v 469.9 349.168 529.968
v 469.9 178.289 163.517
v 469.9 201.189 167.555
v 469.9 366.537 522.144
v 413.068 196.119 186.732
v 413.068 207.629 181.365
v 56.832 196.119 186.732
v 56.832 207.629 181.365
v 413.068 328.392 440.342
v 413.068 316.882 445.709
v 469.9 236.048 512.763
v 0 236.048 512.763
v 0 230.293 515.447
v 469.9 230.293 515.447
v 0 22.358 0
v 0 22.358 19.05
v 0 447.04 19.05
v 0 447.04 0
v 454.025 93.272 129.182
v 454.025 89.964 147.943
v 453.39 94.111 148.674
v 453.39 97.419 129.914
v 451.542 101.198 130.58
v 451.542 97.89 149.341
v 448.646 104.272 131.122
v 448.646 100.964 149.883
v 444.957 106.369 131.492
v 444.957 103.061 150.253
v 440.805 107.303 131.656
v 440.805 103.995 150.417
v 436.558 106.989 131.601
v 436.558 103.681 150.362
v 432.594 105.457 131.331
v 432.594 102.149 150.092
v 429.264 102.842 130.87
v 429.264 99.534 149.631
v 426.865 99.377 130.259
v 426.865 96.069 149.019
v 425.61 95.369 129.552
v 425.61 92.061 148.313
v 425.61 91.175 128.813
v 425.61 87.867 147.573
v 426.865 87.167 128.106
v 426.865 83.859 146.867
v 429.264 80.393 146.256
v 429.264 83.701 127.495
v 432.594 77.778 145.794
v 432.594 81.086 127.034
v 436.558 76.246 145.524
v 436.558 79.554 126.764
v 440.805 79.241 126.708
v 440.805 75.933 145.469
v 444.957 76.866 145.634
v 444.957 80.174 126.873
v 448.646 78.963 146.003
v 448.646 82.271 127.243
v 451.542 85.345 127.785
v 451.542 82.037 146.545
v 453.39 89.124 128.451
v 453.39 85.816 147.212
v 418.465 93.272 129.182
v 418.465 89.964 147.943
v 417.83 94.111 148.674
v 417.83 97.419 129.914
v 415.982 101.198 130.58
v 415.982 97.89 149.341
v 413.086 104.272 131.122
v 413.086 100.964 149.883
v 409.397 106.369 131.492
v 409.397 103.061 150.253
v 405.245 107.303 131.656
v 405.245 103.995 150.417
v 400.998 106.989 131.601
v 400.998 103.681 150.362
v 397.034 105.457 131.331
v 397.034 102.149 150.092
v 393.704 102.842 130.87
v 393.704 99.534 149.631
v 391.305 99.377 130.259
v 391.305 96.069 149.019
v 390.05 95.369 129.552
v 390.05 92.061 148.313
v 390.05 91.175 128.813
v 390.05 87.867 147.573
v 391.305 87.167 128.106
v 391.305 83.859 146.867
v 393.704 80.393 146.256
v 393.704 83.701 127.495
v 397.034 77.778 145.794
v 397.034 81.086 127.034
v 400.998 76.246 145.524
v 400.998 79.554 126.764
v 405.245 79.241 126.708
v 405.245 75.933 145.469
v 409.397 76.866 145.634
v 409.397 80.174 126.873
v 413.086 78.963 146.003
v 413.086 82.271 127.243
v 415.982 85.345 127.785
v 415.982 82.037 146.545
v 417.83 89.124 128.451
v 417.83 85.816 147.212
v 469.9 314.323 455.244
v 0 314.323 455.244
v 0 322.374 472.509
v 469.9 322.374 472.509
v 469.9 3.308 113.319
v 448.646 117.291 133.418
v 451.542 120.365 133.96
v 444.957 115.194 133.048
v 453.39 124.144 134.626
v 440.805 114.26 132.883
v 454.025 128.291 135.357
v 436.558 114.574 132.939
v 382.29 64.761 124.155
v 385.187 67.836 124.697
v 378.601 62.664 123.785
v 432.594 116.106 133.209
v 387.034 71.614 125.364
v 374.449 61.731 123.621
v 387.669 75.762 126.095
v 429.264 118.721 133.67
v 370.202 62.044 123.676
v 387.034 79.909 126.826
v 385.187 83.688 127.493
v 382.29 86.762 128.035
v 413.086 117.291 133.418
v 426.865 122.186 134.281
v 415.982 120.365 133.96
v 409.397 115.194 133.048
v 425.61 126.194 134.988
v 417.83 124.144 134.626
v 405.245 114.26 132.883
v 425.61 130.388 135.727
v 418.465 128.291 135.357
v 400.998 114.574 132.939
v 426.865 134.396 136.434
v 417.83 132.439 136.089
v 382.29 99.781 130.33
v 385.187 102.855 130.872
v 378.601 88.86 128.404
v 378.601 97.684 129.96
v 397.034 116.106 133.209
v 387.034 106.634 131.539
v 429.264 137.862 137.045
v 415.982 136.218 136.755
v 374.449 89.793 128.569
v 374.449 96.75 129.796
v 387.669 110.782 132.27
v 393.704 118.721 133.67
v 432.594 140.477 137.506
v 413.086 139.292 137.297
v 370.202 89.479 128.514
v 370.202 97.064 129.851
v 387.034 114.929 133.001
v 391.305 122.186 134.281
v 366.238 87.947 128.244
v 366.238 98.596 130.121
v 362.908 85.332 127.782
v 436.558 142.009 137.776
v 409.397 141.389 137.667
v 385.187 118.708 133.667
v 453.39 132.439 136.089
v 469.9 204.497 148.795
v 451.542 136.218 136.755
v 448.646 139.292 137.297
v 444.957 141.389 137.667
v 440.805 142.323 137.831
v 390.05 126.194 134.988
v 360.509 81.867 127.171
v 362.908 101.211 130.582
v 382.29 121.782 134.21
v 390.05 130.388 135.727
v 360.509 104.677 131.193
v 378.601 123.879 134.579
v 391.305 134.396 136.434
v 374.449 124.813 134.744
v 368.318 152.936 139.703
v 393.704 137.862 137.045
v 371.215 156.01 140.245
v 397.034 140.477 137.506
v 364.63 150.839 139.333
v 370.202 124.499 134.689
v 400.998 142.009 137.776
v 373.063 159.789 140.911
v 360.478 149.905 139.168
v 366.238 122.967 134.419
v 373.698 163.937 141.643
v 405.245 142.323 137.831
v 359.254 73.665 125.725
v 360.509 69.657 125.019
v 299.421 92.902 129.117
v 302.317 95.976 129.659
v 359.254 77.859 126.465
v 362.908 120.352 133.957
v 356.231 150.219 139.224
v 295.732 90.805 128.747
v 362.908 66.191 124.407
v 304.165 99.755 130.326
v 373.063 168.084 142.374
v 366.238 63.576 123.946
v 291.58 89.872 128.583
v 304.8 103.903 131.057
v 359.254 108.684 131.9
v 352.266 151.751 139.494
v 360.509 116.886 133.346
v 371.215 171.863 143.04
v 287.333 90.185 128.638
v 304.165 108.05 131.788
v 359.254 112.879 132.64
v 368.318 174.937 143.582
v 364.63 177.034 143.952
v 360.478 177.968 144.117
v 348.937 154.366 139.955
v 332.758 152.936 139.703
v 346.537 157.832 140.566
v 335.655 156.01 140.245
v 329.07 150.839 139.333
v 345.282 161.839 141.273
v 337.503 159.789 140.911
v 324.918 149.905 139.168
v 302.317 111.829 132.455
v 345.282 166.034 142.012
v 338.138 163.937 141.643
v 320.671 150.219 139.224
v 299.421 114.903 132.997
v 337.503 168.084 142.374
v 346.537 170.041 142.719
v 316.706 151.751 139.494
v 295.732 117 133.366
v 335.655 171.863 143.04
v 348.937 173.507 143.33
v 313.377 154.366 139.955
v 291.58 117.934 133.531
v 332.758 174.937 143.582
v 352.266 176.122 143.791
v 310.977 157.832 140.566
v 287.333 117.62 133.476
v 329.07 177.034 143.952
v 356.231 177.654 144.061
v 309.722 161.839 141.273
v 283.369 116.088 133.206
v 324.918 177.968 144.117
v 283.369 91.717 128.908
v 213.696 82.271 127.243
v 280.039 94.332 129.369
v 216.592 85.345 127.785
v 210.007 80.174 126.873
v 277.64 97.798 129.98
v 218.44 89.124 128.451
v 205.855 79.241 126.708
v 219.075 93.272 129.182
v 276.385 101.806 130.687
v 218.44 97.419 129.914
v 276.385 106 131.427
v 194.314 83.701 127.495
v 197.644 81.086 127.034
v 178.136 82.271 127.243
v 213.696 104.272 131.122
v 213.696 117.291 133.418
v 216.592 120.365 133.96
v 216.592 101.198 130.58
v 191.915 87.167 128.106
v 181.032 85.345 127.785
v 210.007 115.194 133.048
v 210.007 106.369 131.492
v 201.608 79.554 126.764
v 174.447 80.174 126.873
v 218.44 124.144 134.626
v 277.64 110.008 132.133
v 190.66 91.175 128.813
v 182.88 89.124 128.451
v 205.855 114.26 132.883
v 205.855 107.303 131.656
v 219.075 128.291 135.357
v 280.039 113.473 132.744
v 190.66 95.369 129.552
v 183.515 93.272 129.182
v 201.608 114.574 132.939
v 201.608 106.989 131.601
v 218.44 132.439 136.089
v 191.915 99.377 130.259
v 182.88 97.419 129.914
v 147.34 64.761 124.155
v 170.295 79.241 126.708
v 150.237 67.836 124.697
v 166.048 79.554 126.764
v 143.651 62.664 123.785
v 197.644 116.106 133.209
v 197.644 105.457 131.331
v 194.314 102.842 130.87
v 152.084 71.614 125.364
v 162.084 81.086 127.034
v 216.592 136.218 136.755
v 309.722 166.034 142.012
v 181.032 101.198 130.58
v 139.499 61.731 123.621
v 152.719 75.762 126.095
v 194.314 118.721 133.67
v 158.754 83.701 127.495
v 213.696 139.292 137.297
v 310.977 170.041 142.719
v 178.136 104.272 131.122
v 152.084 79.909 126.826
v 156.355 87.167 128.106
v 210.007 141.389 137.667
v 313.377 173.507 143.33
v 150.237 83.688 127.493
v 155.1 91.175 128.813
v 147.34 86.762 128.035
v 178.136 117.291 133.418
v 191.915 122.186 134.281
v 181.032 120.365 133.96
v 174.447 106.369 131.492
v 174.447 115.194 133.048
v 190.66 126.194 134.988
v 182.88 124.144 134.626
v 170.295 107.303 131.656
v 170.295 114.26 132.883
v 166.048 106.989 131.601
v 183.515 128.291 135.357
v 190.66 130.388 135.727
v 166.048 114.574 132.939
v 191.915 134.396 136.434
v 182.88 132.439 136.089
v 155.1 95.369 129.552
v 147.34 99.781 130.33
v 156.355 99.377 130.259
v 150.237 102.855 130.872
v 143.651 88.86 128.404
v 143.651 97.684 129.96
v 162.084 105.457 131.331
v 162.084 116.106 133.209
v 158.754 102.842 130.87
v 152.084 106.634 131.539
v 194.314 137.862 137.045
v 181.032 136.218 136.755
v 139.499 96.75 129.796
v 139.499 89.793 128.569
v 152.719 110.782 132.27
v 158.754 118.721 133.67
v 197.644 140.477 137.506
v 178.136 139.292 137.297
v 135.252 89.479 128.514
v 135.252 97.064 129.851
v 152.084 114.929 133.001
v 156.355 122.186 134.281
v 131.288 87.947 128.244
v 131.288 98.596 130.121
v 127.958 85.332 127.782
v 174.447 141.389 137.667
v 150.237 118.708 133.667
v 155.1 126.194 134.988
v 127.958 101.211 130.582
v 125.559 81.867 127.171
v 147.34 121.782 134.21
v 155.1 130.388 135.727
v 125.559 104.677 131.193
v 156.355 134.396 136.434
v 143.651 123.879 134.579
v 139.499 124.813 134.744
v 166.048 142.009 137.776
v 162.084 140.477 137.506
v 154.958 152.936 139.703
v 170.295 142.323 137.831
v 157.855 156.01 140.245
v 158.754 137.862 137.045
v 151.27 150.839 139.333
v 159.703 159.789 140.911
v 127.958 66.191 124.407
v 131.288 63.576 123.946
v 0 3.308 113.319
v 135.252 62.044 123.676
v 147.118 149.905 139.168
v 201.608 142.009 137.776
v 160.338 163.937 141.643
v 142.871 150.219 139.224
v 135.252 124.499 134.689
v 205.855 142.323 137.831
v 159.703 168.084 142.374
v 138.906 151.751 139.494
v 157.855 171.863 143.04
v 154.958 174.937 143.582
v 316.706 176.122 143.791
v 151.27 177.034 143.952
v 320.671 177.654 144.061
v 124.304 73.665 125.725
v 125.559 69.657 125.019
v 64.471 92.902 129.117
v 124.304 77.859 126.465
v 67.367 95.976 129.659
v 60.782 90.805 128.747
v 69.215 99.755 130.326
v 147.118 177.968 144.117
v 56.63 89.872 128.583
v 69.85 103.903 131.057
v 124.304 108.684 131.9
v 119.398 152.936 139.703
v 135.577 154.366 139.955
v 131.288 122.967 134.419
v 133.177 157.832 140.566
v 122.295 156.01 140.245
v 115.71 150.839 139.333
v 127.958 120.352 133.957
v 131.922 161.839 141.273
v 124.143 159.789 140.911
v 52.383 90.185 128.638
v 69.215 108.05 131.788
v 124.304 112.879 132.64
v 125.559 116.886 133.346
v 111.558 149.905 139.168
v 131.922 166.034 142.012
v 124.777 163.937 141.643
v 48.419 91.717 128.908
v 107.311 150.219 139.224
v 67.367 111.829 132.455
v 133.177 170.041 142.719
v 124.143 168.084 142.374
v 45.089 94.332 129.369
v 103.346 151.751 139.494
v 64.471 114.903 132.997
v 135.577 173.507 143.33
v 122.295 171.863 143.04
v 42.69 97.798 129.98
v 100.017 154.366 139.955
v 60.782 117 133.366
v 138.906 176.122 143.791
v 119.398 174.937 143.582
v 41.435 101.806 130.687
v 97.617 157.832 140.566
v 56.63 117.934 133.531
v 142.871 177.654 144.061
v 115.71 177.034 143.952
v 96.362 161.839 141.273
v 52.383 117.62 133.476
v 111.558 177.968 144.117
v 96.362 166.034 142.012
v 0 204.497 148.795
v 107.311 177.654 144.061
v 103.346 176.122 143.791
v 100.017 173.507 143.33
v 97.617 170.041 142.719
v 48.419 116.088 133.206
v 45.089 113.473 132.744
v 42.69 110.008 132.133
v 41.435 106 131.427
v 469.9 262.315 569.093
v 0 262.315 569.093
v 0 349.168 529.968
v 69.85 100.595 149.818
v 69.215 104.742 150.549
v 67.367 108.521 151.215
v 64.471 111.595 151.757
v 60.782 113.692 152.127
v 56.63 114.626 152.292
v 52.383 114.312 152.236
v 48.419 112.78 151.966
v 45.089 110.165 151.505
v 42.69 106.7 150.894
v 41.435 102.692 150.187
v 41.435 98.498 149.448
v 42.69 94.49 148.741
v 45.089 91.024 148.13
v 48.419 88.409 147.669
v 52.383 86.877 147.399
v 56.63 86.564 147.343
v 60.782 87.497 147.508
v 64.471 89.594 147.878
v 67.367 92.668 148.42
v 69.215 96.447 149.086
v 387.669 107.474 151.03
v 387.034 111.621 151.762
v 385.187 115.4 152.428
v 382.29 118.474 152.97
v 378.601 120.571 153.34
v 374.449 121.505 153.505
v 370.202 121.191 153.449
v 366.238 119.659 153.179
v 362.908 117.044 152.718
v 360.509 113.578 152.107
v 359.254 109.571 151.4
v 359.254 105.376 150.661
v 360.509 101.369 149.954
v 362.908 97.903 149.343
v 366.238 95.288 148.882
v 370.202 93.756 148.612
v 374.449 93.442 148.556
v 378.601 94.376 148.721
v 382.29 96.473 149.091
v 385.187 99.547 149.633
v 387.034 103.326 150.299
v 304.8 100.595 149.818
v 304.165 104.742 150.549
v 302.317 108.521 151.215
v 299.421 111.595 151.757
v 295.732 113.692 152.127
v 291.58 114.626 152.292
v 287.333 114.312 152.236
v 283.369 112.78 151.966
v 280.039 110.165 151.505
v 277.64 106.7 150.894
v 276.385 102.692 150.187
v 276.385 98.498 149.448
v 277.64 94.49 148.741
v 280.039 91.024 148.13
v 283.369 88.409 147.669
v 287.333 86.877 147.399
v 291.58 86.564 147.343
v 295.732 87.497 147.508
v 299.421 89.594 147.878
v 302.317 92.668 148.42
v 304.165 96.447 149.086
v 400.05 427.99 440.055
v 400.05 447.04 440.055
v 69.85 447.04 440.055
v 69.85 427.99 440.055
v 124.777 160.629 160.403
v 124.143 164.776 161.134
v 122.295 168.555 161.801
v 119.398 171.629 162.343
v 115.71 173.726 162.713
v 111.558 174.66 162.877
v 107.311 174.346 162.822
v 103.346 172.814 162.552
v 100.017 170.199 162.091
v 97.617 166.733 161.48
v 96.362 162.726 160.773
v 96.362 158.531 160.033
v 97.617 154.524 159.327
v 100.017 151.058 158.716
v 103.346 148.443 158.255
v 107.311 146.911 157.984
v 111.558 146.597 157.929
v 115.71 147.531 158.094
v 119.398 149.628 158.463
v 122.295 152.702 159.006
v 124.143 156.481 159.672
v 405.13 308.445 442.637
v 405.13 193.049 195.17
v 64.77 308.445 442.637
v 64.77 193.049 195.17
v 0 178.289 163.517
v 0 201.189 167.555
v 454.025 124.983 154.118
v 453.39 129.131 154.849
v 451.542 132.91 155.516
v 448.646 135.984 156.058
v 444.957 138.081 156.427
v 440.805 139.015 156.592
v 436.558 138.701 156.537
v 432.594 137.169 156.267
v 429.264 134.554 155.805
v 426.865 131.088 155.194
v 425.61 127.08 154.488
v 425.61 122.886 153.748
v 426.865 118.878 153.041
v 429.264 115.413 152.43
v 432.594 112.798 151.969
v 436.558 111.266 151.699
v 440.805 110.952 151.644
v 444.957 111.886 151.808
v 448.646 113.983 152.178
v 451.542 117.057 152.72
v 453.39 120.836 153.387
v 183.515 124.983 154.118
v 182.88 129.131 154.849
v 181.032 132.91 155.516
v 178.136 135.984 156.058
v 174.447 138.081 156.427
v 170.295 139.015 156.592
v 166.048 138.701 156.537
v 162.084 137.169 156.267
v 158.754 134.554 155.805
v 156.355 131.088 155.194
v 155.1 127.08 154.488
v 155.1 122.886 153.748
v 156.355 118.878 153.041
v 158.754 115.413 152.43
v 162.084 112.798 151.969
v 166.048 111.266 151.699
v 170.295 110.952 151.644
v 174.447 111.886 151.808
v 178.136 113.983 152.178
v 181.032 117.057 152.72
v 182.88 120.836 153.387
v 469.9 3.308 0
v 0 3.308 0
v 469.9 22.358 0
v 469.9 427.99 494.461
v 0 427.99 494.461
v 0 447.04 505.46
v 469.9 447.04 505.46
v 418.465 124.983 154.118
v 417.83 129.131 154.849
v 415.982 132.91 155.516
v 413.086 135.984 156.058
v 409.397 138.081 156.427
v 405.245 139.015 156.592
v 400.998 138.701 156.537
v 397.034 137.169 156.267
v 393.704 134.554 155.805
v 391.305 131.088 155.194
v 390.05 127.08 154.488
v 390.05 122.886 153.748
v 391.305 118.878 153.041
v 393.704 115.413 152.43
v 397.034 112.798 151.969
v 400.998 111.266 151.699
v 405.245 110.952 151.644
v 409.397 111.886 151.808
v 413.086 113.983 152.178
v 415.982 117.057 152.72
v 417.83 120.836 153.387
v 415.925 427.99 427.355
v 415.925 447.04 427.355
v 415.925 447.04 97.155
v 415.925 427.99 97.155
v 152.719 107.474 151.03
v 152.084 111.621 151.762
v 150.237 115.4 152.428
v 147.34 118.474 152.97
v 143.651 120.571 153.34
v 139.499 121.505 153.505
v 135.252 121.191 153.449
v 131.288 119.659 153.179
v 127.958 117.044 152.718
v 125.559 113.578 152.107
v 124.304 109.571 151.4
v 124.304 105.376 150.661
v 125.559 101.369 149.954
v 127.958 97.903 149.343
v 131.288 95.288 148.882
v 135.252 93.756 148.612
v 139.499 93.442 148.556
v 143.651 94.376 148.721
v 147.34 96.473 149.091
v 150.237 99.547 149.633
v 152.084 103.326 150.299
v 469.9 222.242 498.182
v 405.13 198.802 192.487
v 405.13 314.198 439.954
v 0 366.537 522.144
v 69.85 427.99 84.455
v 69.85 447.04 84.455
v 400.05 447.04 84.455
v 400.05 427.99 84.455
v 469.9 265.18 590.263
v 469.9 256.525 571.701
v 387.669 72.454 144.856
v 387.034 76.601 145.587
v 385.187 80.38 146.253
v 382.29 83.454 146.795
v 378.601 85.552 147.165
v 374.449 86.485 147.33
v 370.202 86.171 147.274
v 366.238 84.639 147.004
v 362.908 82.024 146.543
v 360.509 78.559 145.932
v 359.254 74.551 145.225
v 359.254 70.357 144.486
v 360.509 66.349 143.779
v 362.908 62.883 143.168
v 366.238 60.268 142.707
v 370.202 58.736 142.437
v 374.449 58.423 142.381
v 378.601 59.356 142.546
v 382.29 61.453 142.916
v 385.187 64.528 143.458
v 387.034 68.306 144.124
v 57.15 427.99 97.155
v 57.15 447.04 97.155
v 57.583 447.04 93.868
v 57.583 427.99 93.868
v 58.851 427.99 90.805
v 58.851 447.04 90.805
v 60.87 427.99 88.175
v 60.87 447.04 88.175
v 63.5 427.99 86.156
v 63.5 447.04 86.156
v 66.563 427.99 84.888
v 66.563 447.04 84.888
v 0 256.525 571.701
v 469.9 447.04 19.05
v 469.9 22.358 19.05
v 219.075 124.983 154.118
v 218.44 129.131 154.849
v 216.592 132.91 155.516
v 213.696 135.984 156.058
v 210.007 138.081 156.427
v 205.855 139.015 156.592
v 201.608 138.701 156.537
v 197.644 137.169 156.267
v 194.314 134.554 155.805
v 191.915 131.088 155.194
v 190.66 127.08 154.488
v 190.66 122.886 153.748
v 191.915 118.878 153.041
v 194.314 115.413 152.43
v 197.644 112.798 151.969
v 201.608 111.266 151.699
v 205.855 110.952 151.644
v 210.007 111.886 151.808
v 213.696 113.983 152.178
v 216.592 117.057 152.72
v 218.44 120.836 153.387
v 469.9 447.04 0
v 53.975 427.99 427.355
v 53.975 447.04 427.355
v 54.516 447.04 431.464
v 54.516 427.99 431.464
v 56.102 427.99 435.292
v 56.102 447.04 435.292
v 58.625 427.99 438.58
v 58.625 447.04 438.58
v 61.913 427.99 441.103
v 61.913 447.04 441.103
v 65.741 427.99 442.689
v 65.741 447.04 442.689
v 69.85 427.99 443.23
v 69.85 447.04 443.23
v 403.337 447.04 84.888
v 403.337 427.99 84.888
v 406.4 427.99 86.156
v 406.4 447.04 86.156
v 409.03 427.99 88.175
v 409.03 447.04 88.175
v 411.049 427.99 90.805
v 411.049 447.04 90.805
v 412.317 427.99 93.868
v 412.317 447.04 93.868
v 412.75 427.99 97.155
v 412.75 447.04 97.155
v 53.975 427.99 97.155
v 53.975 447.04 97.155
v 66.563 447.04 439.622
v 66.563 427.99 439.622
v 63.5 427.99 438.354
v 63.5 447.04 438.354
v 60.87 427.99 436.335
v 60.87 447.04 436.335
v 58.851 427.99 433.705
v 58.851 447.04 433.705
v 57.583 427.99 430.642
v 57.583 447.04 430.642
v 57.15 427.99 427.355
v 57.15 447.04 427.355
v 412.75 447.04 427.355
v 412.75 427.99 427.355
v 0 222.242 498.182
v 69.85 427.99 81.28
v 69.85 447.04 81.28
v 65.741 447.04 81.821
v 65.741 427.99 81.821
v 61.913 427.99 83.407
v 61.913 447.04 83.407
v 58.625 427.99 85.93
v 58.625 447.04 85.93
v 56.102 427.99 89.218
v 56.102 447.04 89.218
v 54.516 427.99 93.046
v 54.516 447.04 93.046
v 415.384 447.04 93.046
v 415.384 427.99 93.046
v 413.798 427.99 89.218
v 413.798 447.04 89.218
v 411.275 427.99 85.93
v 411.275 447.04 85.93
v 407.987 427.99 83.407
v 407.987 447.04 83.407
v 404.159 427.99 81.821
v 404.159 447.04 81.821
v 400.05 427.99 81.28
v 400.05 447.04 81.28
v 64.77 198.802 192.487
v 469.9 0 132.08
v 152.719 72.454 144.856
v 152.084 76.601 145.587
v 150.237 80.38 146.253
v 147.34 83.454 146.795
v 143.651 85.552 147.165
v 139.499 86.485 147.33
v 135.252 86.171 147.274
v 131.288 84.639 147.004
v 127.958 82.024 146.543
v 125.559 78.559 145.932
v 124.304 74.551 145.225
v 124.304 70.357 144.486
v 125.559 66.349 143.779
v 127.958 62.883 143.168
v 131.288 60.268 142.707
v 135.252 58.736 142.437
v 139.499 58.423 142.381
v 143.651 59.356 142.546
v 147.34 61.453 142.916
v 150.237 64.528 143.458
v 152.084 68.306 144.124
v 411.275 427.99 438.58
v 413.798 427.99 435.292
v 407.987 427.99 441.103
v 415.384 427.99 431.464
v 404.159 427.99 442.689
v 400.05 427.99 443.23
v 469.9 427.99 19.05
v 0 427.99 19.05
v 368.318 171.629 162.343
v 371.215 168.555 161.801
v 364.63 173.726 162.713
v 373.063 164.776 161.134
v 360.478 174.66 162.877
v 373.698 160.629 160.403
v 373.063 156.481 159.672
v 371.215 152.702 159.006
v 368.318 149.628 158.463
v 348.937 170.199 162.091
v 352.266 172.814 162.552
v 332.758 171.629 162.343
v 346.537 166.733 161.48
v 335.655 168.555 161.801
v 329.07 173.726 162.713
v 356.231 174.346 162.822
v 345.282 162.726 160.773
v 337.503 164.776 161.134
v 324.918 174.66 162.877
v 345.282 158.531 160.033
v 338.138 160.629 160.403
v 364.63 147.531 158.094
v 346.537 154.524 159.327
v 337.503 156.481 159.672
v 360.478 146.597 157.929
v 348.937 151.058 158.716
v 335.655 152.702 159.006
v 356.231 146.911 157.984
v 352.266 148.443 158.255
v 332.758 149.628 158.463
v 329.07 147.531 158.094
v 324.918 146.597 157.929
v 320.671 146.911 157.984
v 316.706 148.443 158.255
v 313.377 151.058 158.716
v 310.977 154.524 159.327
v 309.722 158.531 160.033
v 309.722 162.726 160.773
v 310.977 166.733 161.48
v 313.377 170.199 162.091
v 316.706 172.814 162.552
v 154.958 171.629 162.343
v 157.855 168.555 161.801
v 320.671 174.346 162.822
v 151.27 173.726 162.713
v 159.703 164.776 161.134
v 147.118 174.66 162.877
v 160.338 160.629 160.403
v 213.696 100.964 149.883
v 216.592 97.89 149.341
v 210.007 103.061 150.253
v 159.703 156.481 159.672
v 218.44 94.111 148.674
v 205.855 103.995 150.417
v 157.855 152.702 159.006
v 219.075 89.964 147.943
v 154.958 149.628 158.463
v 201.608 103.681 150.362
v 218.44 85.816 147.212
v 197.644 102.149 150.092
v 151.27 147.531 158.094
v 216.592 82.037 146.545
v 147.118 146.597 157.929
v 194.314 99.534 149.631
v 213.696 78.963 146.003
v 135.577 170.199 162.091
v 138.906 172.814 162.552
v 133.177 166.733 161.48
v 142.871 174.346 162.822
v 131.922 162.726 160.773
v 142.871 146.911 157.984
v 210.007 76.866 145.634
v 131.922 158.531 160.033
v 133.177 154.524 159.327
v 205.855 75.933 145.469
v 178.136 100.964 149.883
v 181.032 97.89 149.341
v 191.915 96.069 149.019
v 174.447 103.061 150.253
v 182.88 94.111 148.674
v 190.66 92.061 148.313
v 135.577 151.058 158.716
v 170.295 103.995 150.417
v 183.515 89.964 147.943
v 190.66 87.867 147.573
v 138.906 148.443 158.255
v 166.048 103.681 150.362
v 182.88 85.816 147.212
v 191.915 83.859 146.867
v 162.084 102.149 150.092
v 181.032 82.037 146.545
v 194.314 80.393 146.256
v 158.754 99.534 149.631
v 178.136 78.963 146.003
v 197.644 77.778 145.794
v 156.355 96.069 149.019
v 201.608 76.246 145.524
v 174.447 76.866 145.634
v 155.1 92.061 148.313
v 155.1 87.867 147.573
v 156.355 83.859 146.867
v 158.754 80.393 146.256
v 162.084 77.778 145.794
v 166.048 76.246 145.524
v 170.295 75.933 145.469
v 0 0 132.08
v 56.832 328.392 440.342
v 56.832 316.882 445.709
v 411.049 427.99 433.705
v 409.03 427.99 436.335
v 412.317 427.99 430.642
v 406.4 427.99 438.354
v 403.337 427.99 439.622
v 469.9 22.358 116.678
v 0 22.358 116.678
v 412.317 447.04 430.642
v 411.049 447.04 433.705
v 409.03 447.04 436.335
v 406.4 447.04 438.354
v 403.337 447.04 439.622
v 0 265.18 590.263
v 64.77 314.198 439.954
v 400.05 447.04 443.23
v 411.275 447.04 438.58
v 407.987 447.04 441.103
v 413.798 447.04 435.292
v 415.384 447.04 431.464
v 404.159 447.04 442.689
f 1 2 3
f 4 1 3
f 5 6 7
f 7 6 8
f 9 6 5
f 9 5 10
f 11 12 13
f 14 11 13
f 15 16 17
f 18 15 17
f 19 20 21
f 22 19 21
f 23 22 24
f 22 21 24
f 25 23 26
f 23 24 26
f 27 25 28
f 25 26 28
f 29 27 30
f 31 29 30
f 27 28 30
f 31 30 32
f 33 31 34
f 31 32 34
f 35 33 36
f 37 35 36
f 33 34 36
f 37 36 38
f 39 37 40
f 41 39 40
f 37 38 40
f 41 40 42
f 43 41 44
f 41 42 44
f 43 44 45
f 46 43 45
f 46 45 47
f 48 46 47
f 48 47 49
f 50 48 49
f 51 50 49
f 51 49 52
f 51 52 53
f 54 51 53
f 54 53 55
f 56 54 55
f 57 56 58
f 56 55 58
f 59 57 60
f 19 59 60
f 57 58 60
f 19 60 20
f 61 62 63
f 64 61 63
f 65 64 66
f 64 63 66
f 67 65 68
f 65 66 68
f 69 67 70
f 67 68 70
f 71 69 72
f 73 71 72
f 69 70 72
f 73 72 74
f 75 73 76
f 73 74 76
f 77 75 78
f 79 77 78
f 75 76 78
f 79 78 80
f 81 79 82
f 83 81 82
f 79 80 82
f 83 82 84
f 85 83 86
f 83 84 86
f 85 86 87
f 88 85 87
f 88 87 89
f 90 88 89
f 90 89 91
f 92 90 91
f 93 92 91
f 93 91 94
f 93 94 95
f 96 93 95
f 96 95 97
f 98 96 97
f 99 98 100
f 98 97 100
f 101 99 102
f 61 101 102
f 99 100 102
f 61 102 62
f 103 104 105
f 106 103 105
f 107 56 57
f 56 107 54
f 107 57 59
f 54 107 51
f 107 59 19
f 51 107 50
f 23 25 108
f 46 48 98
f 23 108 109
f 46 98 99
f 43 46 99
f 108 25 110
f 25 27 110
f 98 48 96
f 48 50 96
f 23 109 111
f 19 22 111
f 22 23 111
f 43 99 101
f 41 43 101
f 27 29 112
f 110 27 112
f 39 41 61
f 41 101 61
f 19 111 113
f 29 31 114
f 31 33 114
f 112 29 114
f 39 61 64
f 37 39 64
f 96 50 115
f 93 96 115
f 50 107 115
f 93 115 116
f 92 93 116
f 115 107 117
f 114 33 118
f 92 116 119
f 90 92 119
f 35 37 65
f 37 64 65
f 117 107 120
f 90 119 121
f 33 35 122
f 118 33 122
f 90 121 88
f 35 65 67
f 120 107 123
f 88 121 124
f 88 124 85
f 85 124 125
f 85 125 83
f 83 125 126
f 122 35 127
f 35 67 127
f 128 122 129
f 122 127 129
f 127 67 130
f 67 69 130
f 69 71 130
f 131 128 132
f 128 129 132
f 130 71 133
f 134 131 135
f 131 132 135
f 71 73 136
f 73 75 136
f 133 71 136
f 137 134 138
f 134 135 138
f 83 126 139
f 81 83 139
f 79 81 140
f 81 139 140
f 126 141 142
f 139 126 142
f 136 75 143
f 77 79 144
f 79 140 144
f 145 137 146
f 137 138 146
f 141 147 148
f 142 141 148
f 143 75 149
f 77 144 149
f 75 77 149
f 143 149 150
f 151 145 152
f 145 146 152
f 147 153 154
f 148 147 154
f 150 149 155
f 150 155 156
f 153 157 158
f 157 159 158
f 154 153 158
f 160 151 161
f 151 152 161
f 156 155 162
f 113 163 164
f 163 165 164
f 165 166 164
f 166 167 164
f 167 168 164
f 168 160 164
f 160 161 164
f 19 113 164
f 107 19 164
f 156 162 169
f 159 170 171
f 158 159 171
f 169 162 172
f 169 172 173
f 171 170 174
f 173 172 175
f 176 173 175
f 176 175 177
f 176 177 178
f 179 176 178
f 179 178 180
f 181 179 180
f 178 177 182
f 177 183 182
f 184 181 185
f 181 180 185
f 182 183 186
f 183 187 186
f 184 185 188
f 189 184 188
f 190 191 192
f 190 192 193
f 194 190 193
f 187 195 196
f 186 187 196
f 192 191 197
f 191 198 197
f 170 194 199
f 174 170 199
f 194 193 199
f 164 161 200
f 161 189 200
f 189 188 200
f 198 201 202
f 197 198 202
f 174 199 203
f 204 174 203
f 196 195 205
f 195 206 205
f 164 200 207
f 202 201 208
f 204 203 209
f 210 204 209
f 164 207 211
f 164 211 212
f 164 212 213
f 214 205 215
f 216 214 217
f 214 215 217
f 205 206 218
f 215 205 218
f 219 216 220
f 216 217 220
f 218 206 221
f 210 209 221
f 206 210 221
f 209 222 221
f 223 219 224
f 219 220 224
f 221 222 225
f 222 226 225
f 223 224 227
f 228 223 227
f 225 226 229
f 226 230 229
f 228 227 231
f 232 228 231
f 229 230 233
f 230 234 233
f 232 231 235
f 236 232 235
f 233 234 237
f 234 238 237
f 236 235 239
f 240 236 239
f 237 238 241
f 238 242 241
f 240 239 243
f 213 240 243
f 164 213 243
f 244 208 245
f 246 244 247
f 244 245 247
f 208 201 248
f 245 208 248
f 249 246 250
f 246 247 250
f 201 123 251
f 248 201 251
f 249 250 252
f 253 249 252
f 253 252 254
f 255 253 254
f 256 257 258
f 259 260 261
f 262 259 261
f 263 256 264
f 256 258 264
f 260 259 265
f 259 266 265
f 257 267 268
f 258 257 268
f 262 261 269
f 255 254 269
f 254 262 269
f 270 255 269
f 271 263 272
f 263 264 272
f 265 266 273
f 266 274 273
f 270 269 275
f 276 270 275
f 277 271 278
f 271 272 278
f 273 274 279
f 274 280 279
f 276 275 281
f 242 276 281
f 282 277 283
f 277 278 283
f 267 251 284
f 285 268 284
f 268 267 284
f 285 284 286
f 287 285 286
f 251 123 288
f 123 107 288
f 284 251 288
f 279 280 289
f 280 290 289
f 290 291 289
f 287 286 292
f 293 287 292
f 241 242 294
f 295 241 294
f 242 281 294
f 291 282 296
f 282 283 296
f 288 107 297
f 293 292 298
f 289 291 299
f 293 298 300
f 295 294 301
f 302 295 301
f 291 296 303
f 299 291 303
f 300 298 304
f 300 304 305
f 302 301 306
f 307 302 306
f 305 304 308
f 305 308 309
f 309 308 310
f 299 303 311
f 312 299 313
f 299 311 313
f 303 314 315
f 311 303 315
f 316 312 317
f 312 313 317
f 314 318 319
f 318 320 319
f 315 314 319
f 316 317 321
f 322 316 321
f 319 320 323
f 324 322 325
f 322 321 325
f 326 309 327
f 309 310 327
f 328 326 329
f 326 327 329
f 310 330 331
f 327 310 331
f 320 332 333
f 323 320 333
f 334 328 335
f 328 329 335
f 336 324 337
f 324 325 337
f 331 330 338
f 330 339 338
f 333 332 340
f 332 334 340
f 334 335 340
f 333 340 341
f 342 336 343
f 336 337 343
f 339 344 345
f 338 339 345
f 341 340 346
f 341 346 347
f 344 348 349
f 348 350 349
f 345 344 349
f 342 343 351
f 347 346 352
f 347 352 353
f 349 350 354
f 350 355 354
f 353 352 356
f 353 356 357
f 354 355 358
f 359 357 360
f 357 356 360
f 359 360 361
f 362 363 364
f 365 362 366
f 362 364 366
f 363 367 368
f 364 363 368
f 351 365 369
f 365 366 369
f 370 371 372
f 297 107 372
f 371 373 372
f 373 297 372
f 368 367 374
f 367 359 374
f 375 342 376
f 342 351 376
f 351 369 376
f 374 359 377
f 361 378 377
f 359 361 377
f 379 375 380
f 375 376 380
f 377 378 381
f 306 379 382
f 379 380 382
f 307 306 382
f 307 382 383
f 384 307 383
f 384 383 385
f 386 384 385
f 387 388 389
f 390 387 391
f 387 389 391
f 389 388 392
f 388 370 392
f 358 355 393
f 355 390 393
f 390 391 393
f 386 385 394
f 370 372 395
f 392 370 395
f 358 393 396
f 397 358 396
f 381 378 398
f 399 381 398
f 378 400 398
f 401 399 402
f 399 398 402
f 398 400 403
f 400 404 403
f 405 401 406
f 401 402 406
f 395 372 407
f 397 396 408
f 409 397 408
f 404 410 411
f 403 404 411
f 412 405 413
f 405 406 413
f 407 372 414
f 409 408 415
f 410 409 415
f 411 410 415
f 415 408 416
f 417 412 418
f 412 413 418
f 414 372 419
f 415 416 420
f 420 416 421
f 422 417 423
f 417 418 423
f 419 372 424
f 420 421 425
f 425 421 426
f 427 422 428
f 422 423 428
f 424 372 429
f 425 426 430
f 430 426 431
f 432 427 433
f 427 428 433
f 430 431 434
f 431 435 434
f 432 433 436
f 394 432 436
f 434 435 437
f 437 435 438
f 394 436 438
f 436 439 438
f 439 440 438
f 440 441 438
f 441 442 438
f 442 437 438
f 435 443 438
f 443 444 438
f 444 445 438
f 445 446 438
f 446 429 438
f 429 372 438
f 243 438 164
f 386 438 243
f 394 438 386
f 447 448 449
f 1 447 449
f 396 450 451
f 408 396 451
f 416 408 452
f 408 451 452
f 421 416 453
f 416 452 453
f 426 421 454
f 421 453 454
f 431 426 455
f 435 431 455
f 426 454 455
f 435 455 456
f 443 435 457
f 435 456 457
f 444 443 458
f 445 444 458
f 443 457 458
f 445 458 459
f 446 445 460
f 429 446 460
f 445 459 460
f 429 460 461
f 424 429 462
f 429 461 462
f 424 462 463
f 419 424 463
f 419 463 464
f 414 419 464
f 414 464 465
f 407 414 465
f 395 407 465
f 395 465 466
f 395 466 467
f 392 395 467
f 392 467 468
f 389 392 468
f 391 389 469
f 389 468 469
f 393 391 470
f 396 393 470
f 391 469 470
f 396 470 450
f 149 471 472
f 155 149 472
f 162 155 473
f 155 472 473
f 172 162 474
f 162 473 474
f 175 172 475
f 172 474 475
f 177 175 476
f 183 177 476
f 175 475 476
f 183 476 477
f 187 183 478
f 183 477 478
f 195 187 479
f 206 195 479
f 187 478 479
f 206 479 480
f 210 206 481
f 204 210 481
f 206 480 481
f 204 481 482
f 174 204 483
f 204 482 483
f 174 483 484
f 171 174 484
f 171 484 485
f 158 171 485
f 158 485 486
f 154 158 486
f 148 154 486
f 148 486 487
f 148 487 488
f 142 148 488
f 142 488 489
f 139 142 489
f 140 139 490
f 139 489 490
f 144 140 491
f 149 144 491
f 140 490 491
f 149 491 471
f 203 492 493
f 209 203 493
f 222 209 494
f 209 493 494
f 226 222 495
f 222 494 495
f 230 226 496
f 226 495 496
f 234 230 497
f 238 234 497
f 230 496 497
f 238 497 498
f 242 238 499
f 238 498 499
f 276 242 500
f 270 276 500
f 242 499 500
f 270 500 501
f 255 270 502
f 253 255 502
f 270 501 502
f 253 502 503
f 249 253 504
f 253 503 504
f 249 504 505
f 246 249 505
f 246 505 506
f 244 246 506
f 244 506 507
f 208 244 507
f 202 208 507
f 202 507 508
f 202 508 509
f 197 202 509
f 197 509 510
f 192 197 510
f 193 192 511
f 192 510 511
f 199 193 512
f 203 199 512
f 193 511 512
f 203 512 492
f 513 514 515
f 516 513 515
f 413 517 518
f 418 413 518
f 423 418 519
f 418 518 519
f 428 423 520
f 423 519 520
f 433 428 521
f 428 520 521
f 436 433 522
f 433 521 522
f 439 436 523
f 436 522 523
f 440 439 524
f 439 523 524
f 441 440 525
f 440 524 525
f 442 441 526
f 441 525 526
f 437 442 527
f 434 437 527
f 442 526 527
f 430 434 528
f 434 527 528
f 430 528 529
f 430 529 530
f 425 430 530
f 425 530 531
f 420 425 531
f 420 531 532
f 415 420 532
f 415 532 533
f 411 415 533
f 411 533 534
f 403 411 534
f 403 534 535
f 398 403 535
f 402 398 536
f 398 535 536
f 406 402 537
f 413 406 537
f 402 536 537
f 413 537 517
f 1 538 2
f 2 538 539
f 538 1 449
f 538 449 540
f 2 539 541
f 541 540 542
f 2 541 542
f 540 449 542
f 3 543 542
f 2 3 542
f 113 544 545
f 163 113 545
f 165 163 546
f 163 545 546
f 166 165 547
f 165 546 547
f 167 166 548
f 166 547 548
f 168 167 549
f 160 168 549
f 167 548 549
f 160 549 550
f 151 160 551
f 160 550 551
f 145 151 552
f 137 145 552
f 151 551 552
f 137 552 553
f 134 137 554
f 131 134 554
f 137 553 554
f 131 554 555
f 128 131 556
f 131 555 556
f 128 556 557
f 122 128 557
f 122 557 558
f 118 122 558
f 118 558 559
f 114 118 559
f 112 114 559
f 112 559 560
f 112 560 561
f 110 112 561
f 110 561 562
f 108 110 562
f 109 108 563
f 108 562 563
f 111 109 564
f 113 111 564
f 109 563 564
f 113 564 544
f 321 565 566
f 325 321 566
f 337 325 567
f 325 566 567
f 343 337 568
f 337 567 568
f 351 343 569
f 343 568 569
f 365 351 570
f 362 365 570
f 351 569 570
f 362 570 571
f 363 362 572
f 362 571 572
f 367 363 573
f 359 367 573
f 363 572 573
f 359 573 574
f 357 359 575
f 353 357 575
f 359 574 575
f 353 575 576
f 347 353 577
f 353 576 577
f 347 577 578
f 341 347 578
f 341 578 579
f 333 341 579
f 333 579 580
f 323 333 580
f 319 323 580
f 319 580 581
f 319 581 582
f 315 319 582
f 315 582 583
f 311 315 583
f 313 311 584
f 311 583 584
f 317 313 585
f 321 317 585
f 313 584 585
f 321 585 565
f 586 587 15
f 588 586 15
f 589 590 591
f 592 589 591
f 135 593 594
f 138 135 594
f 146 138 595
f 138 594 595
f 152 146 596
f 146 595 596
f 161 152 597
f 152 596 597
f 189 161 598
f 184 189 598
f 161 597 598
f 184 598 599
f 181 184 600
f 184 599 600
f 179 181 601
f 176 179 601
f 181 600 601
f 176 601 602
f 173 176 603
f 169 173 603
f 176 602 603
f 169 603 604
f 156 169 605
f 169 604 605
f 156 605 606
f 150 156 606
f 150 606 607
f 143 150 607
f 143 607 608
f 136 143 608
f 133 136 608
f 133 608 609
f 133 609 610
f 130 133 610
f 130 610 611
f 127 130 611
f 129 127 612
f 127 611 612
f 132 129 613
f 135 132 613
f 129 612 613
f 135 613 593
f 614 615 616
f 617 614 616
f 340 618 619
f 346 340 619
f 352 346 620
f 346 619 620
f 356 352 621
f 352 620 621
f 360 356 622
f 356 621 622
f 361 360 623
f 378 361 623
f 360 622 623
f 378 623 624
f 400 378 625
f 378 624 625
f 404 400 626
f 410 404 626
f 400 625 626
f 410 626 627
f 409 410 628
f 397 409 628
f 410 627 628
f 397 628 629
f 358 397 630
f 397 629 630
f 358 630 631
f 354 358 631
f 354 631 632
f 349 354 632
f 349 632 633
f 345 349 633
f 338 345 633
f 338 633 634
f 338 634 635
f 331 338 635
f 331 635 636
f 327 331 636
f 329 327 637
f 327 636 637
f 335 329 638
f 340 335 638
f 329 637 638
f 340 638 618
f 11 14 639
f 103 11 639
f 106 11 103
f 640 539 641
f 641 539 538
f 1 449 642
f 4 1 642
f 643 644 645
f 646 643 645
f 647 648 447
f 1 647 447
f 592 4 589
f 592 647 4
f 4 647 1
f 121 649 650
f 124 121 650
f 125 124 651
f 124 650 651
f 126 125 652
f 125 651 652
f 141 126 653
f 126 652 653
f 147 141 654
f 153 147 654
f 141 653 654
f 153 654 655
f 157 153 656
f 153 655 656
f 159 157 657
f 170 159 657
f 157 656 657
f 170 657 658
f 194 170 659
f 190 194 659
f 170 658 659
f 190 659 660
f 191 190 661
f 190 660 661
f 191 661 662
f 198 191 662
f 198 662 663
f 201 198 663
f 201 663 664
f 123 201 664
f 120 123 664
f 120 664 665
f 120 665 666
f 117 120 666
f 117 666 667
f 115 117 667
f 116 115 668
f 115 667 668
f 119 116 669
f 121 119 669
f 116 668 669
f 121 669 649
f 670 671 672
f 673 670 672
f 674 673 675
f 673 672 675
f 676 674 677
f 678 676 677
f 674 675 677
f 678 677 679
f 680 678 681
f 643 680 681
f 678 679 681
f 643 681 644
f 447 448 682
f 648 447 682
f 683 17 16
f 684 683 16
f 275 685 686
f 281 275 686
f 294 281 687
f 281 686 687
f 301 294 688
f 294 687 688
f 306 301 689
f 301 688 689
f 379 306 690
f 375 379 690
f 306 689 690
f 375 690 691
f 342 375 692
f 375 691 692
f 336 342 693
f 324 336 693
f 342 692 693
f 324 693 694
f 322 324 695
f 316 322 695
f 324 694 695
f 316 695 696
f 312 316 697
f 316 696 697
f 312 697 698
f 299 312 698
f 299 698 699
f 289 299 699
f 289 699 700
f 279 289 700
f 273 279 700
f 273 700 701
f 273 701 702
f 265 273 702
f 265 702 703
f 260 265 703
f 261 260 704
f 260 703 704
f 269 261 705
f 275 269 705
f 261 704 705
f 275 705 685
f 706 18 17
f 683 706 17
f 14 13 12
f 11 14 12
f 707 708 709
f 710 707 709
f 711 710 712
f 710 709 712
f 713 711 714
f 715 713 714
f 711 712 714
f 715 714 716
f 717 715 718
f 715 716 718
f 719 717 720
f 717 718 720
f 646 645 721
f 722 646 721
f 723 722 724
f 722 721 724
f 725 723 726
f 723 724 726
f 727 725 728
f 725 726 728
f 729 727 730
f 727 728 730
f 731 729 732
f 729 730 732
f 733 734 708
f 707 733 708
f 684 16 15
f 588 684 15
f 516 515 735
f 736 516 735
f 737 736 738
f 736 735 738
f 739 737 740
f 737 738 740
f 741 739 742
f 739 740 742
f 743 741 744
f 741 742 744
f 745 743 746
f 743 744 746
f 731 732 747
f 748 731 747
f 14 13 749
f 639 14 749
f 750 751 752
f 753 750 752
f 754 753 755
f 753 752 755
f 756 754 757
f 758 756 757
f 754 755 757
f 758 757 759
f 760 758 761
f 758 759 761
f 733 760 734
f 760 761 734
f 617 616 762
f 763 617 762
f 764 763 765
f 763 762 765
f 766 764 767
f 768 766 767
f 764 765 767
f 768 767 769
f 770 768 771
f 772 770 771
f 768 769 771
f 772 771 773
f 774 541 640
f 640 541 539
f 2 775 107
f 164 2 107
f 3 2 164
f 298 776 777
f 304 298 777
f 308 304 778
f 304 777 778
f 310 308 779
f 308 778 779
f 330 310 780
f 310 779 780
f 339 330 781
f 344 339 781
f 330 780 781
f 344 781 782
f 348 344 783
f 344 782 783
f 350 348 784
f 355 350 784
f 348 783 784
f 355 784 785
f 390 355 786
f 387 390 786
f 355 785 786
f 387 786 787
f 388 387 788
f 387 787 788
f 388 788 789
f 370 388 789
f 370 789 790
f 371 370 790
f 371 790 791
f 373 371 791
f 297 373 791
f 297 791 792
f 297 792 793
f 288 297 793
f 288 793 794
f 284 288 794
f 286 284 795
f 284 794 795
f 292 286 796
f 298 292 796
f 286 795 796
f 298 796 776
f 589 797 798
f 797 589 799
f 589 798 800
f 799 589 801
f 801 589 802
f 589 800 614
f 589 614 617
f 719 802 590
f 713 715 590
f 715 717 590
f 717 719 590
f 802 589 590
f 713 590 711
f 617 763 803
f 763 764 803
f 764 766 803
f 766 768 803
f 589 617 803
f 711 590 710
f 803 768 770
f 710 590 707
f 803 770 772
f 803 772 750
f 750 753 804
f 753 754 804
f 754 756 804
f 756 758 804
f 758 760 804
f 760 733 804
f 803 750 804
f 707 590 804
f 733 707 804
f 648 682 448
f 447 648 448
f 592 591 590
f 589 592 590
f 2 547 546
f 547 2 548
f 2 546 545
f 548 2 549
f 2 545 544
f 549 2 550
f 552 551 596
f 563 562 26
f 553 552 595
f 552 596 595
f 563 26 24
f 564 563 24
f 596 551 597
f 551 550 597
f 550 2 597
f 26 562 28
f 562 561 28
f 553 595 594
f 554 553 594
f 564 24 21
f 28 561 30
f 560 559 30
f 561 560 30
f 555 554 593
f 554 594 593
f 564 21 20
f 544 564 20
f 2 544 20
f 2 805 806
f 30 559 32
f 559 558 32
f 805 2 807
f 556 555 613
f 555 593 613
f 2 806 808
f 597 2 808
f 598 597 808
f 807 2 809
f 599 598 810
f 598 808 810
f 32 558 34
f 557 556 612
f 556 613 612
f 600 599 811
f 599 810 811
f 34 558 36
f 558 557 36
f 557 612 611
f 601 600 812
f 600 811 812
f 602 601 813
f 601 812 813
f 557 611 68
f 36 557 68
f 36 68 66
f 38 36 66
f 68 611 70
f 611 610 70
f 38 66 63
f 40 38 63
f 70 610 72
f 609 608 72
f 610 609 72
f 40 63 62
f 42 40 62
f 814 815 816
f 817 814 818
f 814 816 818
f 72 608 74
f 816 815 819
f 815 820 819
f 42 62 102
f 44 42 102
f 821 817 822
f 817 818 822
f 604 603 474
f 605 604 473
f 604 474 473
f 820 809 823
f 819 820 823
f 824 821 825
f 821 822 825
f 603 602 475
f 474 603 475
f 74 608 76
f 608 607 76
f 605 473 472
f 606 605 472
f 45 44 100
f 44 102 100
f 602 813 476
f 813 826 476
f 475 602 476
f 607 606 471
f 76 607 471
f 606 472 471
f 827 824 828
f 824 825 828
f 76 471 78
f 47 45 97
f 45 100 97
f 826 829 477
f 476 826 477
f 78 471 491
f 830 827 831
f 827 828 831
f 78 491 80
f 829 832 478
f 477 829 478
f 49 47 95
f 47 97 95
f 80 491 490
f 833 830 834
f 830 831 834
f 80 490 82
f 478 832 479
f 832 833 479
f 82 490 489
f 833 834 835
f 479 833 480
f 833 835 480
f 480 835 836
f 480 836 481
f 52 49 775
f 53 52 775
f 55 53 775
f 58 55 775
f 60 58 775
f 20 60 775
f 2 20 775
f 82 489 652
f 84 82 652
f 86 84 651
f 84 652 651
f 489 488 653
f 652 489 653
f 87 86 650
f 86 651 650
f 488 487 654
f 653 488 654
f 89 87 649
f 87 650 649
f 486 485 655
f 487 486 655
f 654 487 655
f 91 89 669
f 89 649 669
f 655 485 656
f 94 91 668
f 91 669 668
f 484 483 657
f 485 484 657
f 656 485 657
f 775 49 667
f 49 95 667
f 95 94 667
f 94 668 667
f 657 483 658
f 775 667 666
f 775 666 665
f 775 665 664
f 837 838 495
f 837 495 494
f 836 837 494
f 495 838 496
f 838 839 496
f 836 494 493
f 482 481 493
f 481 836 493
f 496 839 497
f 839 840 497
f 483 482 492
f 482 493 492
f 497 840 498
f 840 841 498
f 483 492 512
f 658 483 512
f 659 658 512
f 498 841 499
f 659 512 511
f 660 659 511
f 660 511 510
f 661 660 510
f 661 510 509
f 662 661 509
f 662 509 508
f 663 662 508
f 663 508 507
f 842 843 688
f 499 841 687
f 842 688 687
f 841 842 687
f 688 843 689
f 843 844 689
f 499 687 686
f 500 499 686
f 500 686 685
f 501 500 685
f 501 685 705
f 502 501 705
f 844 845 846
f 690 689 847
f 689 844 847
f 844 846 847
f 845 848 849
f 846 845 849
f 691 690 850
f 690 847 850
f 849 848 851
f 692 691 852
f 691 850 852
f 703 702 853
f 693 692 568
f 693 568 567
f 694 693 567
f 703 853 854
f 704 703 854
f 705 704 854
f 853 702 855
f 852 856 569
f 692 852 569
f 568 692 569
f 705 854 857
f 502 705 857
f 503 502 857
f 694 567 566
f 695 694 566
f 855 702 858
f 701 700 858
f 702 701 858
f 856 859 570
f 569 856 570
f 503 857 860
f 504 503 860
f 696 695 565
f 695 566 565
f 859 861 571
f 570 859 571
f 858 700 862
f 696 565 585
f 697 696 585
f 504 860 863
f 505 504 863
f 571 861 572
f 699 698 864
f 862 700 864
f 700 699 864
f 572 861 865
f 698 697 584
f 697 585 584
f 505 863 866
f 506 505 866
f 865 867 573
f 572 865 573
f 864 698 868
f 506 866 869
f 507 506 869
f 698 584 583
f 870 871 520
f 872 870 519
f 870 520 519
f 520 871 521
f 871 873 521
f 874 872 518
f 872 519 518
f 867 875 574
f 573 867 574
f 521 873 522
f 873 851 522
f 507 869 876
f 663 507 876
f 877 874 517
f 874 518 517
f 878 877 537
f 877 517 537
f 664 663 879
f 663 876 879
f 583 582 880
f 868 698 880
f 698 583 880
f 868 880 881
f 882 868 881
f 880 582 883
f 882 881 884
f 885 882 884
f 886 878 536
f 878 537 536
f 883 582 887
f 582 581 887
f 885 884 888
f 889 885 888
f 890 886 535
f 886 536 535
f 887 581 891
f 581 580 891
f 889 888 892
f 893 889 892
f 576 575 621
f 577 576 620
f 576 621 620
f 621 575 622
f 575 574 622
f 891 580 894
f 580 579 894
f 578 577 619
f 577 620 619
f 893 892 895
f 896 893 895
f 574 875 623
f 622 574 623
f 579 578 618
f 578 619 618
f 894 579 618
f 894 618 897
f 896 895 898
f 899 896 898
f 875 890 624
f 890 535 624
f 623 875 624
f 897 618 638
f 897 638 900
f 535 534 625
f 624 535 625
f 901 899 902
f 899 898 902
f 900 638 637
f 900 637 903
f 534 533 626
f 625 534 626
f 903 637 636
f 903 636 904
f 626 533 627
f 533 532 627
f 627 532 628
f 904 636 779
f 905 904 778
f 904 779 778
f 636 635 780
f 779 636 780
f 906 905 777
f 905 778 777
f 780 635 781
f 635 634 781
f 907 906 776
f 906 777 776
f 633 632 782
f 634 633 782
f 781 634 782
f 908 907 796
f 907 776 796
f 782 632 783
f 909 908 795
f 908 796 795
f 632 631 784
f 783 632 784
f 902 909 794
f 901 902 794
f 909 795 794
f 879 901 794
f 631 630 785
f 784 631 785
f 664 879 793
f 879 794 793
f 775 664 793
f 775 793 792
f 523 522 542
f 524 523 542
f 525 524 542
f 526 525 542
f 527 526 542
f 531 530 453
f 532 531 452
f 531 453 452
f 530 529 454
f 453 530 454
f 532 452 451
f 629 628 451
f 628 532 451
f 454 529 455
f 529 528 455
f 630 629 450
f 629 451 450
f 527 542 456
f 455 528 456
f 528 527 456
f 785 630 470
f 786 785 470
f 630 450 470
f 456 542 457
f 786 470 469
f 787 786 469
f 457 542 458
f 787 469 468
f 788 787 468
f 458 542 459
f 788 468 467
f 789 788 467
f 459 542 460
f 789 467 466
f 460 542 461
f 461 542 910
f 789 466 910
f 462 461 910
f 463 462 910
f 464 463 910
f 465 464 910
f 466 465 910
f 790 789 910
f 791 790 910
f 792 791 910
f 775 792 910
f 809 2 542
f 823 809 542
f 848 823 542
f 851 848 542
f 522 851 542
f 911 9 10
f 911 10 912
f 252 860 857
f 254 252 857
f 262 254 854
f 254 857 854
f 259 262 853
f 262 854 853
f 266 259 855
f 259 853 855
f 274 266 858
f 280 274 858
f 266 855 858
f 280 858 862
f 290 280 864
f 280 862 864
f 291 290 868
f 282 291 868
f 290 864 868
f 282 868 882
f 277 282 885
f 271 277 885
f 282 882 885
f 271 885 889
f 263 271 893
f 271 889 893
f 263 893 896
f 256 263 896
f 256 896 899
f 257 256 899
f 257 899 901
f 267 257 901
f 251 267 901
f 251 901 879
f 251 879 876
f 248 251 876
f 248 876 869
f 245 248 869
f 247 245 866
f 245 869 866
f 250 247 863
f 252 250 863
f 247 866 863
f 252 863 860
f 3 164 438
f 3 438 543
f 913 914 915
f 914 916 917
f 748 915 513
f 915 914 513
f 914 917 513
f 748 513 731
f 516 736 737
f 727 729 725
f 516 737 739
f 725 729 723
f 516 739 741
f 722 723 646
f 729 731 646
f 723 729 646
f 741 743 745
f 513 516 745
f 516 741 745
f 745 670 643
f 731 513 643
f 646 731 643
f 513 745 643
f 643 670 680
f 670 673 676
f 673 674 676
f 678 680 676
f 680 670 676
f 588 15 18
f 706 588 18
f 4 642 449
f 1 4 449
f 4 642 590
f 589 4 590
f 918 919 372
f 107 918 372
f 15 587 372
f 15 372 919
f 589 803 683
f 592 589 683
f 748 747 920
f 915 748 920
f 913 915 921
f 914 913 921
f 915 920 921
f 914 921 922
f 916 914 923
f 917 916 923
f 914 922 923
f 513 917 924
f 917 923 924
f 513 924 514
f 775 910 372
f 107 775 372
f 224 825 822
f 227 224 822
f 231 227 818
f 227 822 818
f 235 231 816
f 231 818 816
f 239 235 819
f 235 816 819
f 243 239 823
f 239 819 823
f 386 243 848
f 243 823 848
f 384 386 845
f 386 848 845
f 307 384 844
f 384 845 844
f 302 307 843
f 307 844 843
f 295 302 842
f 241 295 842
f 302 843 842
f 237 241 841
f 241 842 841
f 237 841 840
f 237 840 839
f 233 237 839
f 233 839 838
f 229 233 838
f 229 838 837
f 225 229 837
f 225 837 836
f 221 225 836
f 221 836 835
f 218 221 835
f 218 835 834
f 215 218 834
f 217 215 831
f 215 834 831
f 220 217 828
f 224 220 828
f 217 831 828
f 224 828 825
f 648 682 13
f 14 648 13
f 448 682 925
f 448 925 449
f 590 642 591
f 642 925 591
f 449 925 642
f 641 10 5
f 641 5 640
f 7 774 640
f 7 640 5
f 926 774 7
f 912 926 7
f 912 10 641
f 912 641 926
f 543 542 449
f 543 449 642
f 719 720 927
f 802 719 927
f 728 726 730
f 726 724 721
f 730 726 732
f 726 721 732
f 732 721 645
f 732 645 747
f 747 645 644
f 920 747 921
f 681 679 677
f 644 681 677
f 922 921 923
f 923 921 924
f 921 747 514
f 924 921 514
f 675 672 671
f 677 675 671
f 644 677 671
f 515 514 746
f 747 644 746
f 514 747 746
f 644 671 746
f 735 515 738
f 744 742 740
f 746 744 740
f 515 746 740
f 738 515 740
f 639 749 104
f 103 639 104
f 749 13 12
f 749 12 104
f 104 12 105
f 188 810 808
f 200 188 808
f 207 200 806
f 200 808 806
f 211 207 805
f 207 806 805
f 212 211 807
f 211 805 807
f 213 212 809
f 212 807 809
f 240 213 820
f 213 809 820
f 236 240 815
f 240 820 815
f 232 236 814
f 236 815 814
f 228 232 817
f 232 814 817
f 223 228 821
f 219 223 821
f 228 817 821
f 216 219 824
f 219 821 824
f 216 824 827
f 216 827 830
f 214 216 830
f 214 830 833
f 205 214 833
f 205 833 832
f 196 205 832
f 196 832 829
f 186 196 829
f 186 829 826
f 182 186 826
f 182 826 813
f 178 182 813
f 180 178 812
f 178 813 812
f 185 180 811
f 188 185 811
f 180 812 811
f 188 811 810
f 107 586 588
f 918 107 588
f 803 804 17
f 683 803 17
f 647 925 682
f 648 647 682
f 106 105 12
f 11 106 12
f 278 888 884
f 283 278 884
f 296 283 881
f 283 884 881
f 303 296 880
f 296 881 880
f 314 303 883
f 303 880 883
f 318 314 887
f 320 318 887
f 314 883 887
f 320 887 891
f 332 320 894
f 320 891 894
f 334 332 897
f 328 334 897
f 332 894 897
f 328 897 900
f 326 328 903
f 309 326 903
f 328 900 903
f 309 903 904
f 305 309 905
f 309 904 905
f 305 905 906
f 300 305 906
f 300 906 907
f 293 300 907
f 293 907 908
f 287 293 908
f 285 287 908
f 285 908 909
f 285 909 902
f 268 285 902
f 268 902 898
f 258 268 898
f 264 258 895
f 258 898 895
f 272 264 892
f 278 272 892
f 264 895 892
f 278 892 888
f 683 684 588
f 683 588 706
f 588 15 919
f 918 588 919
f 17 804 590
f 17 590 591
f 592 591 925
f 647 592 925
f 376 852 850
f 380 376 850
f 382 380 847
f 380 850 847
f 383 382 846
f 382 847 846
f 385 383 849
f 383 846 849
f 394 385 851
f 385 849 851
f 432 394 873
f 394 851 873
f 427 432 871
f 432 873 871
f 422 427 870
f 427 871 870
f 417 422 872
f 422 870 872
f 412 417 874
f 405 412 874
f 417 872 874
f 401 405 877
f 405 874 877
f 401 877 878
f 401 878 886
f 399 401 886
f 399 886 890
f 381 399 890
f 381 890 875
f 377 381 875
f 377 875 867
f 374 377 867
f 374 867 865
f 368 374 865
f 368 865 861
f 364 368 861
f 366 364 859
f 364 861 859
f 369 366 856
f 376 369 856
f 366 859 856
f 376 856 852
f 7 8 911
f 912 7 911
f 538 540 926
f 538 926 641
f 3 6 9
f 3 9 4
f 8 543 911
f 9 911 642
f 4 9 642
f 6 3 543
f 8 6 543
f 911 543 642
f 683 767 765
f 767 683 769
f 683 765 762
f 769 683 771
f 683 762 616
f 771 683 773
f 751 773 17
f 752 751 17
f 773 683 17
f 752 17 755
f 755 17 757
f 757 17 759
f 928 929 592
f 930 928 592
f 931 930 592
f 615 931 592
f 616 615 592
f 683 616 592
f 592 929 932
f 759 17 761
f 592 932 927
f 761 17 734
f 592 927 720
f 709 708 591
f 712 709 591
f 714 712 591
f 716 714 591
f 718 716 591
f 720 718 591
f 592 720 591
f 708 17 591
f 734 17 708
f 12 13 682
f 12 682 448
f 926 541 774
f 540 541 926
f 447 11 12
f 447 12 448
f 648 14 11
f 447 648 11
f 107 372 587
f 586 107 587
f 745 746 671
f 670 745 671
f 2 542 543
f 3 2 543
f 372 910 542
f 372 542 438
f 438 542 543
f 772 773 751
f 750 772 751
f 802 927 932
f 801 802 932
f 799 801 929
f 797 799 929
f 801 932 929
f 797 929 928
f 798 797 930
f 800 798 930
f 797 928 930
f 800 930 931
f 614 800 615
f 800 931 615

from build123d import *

# Parameters (mm, degrees)
F1_DEPTH  = 469.9
F2_DEPTH  = 469.9
F3_DEPTH  = 469.9
F4_DEPTH  = 469.9
F5_DEPTH  = 469.9
F6_DEPTH  = 469.9
F7_DEPTH  = 469.9
F8_DEPTH  = 469.9
F9_R      = 14.2875
F10_DEPTH = 19.05
F11_W     = 340.36
F11_H     = 273.05
F12_DEPTH = 19.05
F14_DEPTH = 19.05
F15_W     = 356.235
F15_H     = 285.75
F15_W_2   = 340.36
F15_H_2   = 273.05
F16_DEPTH = 12.7


with BuildPart() as f1:
    # F0 (on Right) → F1 (new body)
    with BuildSketch(Plane.YZ):
        Polygon((447.04, 19.05), (447.04, 505.46), (427.99, 494.4614773719), (427.99, 19.05), align=None)
    extrude(amount=F1_DEPTH)

    # F13 (on face) → F14 (cut)
    with BuildSketch(Plane(origin=(0, 447.04, 0), x_dir=(-1, 0, 0), z_dir=(0, 1, 0))):
        with BuildLine():
            Line((-400.05, 81.28), (-69.85, 81.28))
            ThreePointArc((-69.85, 81.28), (-58.6246798487, 85.9296798487), (-53.975, 97.155))
            Line((-53.975, 97.155), (-53.975, 427.355))
            ThreePointArc((-53.975, 427.355), (-58.6246798487, 438.5803201513), (-69.85, 443.23))
            Line((-69.85, 443.23), (-400.05, 443.23))
            ThreePointArc((-400.05, 443.23), (-411.2753201513, 438.5803201513), (-415.925, 427.355))
            Line((-415.925, 427.355), (-415.925, 97.155))
            ThreePointArc((-415.925, 97.155), (-411.2753201513, 85.9296798487), (-400.05, 81.28))
        make_face()
        with BuildLine():
            Line((-69.85, 84.455), (-400.05, 84.455))
            ThreePointArc((-400.05, 84.455), (-409.0302561211, 88.1747438789), (-412.75, 97.155))
            Line((-412.75, 97.155), (-412.75, 427.355))
            ThreePointArc((-412.75, 427.355), (-409.0302561211, 436.3352561211), (-400.05, 440.055))
            Line((-400.05, 440.055), (-69.85, 440.055))
            ThreePointArc((-69.85, 440.055), (-60.8697438789, 436.3352561211), (-57.15, 427.355))
            Line((-57.15, 427.355), (-57.15, 97.155))
            ThreePointArc((-57.15, 97.155), (-60.8697438789, 88.1747438789), (-69.85, 84.455))
        make_face(mode=Mode.SUBTRACT)
    extrude(amount=-F14_DEPTH, mode=Mode.SUBTRACT)


with BuildPart() as f2:
    # F0 (on Right) → F2 (new body)
    with BuildSketch(Plane.YZ):
        Polygon((427.99, 494.4614773719), (447.04, 505.46), (265.1802794532, 590.2625804009), (256.5248281929, 571.700905273), (262.3150132288, 569.0926171005), (349.1677887675, 529.9682945134), (366.5368556977, 522.1441003712), align=None)
    extrude(amount=F2_DEPTH)


with BuildPart() as f3:
    # F0 (on Right) → F3 (new body)
    with BuildSketch(Plane.YZ):
        Polygon((447.04, 0), (447.04, 19.05), (427.99, 19.05), (22.3579977846, 19.05), (22.3579977846, 0), align=None)
    extrude(amount=F3_DEPTH)


with BuildPart() as f4:
    # F0 (on Right) → F4 (new body)
    with BuildSketch(Plane.YZ):
        Polygon((22.3579977846, 0), (22.3579977846, 19.05), (22.3579977846, 116.6784412876), (3.3079977846, 113.3194123051), (3.3079977846, 0), align=None)
    extrude(amount=F4_DEPTH)


with BuildPart() as f5:
    # F0 (on Right) → F5 (new body)
    with BuildSketch(Plane.YZ):
        Polygon((204.4972870801, 148.7945122375), (201.1892892955, 167.5550999324), (178.2888026757, 163.5171262699), (0, 132.08), (3.3079977846, 113.3194123051), (22.3579977846, 116.6784412876), align=None)
    extrude(amount=F5_DEPTH)

    # F9 (on face) → F10 (cut)
    with BuildSketch(Plane(origin=(0, -22.5870102652, 128.0973006767), x_dir=(1, 0, 0), z_dir=(0, -0.1736481777, 0.984807753))):
        with Locations((138.4316366414, 132.0669304948)):
            Circle(F9_R)
        with Locations((138.4316366414, 96.5069304948)):
            Circle(F9_R)
        with Locations((169.2275, 114.2869304948)):
            Circle(F9_R)
        with Locations((169.2275, 149.8469304948)):
            Circle(F9_R)
        with Locations((204.7875, 149.8469304948)):
            Circle(F9_R)
        with Locations((204.7875, 114.2869304948)):
            Circle(F9_R)
        with Locations((110.49, 186.0419304948)):
            Circle(F9_R)
        with Locations((146.05, 186.0419304948)):
            Circle(F9_R)
        with Locations((55.5625, 125.0819304948)):
            Circle(F9_R)
        with Locations((323.85, 186.0419304948)):
            Circle(F9_R)
        with Locations((359.41, 186.0419304948)):
            Circle(F9_R)
        with Locations((290.5125, 125.0819304948)):
            Circle(F9_R)
        with Locations((373.3816366414, 96.5069304948)):
            Circle(F9_R)
        with Locations((373.3816366414, 132.0669304948)):
            Circle(F9_R)
        with Locations((404.1775, 114.2869304948)):
            Circle(F9_R)
        with Locations((404.1775, 149.8469304948)):
            Circle(F9_R)
        with Locations((439.7375, 149.8469304948)):
            Circle(F9_R)
        with Locations((439.7375, 114.2869304948)):
            Circle(F9_R)
    extrude(amount=-F10_DEPTH, mode=Mode.SUBTRACT)


with BuildPart() as f6:
    # F0 (on Right) → F6 (new body)
    with BuildSketch(Plane.YZ):
        Polygon((201.1892892955, 167.5550999324), (366.5368556977, 522.1441003712), (349.1677887675, 529.9682945134), (322.3740131095, 472.5088571882), (314.3231352233, 455.2436938451), (178.2888026757, 163.5171262699), align=None)
    extrude(amount=F6_DEPTH)

    # F11 (on face) → F12 (cut)
    with BuildSketch(Plane(origin=(0, 83.8146250238, -39.083401514), x_dir=(1, 0, 0), z_dir=(0, -0.906307787, 0.4226182617))):
        with Locations((234.95, 394.9949487269)):
            Rectangle(F11_W, F11_H)
    extrude(amount=-F12_DEPTH, mode=Mode.SUBTRACT)

    # F15 (on face) → F16 (cut)
    with BuildSketch(Plane(origin=(0, 101.0783092184, -47.1335896619), x_dir=(-1, 0, 0), z_dir=(0, 0.906307787, -0.4226182617))):
        with Locations((-234.95, 394.9949487269)):
            Rectangle(F15_W, F15_H)
        with Locations((-234.95, 394.9949487269)):
            Rectangle(F15_W_2, F15_H_2, mode=Mode.SUBTRACT)
    extrude(amount=-F16_DEPTH, mode=Mode.SUBTRACT)


with BuildPart() as f7:
    # F0 (on Right) → F7 (new body)
    with BuildSketch(Plane.YZ):
        Polygon((236.0481963942, 512.763246619), (230.2931419465, 515.446872581), (222.2422640604, 498.181709238), (314.3231352233, 455.2436938451), (322.3740131095, 472.5088571882), align=None)
    extrude(amount=F7_DEPTH)


with BuildPart() as f8:
    # F0 (on Right) → F8 (new body)
    with BuildSketch(Plane.YZ):
        Polygon((262.3150132288, 569.0926171005), (256.5248281929, 571.700905273), (230.2931419465, 515.446872581), (236.0481963942, 512.763246619), align=None)
    extrude(amount=F8_DEPTH)


solid = Compound([f1.part, f2.part, f3.part, f4.part, f5.part, f6.part, f7.part, f8.part])
